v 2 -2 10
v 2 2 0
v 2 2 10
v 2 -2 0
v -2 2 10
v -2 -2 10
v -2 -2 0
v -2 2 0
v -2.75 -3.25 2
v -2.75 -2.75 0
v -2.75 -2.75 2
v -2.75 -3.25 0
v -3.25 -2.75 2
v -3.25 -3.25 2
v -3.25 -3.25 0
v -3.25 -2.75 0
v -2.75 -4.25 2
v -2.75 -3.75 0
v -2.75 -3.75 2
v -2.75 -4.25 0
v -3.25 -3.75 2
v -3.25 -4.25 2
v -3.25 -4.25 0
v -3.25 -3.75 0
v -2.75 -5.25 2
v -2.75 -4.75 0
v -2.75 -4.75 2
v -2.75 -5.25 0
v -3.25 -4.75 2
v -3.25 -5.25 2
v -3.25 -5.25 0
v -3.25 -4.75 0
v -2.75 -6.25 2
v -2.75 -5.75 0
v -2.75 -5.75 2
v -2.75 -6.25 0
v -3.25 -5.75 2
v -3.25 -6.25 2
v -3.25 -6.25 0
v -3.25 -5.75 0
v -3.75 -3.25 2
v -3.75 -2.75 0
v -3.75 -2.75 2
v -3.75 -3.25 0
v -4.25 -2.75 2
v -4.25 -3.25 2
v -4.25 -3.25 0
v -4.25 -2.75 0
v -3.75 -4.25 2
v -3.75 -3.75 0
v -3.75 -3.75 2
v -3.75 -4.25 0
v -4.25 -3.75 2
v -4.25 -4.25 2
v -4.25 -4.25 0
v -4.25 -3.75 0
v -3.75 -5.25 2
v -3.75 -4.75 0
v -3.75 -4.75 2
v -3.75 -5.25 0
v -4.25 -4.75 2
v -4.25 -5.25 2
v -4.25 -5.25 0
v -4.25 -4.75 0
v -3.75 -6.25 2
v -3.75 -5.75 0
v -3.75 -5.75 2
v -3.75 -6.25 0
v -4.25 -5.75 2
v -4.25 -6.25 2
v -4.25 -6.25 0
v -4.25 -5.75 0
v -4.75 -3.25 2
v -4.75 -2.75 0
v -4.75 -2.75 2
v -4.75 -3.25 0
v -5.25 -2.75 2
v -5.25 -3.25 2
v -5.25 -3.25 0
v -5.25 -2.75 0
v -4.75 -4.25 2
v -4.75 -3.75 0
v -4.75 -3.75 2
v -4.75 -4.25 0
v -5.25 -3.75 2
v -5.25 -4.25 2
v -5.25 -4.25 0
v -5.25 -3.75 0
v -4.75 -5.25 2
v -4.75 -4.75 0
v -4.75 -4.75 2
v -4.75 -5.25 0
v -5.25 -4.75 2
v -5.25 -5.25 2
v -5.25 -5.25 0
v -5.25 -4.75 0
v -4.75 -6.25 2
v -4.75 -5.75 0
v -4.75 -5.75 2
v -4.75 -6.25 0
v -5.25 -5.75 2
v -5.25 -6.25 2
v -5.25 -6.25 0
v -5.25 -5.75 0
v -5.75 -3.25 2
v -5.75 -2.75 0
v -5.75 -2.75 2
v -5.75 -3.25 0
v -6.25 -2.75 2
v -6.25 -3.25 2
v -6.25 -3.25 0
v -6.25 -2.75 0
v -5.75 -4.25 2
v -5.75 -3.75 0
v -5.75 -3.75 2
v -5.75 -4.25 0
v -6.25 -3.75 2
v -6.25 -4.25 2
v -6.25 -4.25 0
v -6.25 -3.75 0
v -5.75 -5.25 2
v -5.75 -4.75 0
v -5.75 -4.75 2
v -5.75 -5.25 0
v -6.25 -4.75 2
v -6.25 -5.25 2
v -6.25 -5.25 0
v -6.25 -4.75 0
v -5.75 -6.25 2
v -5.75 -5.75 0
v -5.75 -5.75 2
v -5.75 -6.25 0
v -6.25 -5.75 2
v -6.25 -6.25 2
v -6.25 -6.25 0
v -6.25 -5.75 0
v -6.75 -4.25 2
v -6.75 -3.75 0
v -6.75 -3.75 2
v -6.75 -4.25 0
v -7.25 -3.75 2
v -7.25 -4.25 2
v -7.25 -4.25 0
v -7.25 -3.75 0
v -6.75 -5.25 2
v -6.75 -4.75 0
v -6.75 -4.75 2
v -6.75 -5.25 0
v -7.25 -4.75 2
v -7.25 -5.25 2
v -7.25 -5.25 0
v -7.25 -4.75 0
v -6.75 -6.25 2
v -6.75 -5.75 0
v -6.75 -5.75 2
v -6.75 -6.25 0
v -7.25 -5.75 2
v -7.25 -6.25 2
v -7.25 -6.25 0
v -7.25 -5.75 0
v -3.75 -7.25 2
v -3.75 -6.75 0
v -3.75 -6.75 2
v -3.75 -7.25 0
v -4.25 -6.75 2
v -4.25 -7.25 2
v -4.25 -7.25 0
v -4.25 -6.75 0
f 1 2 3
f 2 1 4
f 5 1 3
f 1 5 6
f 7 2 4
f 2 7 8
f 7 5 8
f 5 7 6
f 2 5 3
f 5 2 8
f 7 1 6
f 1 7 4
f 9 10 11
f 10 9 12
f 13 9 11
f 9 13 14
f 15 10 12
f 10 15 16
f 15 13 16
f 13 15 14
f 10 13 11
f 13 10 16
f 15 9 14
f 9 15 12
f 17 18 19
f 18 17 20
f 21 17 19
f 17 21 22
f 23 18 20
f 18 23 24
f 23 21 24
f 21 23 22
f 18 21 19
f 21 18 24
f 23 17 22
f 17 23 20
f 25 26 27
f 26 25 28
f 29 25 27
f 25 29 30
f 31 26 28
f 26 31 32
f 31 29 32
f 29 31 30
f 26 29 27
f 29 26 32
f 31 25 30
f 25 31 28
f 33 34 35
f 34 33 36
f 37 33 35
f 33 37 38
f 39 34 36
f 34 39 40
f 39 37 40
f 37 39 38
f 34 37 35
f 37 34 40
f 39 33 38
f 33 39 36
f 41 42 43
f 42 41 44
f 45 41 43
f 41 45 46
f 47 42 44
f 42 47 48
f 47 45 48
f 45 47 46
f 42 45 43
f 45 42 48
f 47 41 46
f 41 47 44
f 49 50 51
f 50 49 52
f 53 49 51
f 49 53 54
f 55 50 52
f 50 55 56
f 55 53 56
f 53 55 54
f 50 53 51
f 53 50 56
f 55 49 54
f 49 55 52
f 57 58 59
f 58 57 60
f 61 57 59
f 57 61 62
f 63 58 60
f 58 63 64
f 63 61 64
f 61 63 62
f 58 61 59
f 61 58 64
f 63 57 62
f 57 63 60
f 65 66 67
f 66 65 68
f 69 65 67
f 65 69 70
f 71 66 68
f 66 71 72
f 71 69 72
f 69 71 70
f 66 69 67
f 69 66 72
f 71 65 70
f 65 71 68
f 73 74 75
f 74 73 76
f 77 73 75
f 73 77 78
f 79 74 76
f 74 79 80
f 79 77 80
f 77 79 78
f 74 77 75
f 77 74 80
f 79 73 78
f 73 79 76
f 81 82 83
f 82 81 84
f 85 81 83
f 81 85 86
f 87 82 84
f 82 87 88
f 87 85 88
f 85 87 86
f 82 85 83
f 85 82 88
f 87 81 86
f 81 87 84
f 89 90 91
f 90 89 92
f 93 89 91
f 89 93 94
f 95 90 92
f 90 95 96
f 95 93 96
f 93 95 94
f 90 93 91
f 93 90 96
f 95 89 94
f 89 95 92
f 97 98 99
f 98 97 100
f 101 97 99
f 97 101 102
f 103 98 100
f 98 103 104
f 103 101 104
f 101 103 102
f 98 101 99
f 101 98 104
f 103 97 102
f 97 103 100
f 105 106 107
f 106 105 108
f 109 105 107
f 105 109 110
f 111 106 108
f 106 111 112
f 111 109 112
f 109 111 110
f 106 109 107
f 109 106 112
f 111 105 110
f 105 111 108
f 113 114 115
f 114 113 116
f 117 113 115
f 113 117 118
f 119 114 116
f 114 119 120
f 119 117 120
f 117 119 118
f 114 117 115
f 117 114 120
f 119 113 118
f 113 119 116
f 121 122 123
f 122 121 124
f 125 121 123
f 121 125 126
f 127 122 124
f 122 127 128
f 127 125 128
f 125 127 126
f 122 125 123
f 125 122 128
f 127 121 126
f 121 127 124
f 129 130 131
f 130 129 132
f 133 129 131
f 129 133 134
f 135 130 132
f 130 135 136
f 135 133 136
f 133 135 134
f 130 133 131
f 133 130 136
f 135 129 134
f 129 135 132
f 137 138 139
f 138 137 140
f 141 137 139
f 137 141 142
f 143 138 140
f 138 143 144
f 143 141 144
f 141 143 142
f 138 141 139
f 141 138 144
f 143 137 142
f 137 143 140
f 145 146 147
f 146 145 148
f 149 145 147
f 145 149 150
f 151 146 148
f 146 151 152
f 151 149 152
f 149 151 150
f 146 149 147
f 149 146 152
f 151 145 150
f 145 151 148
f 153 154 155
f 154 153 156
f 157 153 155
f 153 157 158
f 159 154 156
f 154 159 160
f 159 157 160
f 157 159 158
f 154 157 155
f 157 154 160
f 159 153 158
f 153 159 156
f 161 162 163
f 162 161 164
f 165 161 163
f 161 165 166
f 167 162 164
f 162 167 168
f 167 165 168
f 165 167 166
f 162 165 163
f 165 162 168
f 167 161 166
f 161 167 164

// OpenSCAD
translate([0, 0, 5]) color([0,1,0,0.9]) cube([4, 4, 10], center=true);
translate([-3, -3, 1]) color([1,0,0]) cube([0.5, 0.5, 2], center=true);
translate([-3, -4, 1]) color([1,0,0]) cube([0.5, 0.5, 2], center=true);
translate([-3, -5, 1]) color([1,0,0]) cube([0.5, 0.5, 2], center=true);
translate([-3, -6, 1]) color([1,0,0]) cube([0.5, 0.5, 2], center=true);
translate([-4, -3, 1]) color([1,0,0]) cube([0.5, 0.5, 2], center=true);
translate([-4, -4, 1]) color([1,0,0]) cube([0.5, 0.5, 2], center=true);
translate([-4, -5, 1]) color([1,0,0]) cube([0.5, 0.5, 2], center=true);
translate([-4, -6, 1]) color([1,0,0]) cube([0.5, 0.5, 2], center=true);
translate([-5, -3, 1]) color([1,0,0]) cube([0.5, 0.5, 2], center=true);
translate([-5, -4, 1]) color([1,0,0]) cube([0.5, 0.5, 2], center=true);
translate([-5, -5, 1]) color([1,0,0]) cube([0.5, 0.5, 2], center=true);
translate([-5, -6, 1]) color([1,0,0]) cube([0.5, 0.5, 2], center=true);
translate([-6, -3, 1]) color([1,0,0]) cube([0.5, 0.5, 2], center=true);
translate([-6, -4, 1]) color([1,0,0]) cube([0.5, 0.5, 2], center=true);
translate([-6, -5, 1]) color([1,0,0]) cube([0.5, 0.5, 2], center=true);
translate([-6, -6, 1]) color([1,0,0]) cube([0.5, 0.5, 2], center=true);
translate([-7, -4, 1]) color([1,0,0]) cube([0.5, 0.5, 2], center=true);
translate([-7, -5, 1]) color([1,0,0]) cube([0.5, 0.5, 2], center=true);
translate([-7, -6, 1]) color([1,0,0]) cube([0.5, 0.5, 2], center=true);
translate([-4, -7, 1]) color([1,0,0]) cube([0.5, 0.5, 2], center=true);
